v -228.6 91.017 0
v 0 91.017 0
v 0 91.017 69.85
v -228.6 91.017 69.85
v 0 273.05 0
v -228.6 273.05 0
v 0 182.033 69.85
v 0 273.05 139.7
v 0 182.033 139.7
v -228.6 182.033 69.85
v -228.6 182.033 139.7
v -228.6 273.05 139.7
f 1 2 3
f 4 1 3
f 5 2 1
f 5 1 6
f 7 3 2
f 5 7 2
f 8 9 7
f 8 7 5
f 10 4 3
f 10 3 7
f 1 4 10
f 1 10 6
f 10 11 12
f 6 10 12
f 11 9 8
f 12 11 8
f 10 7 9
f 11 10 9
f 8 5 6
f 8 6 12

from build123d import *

# Parameters (mm, degrees)
F0_W     = 273.05
F0_H     = 228.6
F1_DEPTH = 228.6
F3_DEPTH = 228.6


with BuildPart() as f1:
    # F0 (on Right) → F1 (new body)
    with BuildSketch(Plane.YZ):
        with Locations((136.525, 114.3)):
            Rectangle(F0_W, F0_H)
    extrude(amount=-F1_DEPTH)

    # F2 (on face) → F3 (cut, through all)
    with BuildSketch(Plane.YZ):
        Polygon((182.033333, 139.7), (273.05, 139.7), (273.05, 228.6), (0, 228.6), (0, 0), (91.016667, 0), (91.016667, 69.85), (182.033333, 69.85), align=None)
    extrude(amount=-F3_DEPTH, mode=Mode.SUBTRACT)


solid = f1.part
